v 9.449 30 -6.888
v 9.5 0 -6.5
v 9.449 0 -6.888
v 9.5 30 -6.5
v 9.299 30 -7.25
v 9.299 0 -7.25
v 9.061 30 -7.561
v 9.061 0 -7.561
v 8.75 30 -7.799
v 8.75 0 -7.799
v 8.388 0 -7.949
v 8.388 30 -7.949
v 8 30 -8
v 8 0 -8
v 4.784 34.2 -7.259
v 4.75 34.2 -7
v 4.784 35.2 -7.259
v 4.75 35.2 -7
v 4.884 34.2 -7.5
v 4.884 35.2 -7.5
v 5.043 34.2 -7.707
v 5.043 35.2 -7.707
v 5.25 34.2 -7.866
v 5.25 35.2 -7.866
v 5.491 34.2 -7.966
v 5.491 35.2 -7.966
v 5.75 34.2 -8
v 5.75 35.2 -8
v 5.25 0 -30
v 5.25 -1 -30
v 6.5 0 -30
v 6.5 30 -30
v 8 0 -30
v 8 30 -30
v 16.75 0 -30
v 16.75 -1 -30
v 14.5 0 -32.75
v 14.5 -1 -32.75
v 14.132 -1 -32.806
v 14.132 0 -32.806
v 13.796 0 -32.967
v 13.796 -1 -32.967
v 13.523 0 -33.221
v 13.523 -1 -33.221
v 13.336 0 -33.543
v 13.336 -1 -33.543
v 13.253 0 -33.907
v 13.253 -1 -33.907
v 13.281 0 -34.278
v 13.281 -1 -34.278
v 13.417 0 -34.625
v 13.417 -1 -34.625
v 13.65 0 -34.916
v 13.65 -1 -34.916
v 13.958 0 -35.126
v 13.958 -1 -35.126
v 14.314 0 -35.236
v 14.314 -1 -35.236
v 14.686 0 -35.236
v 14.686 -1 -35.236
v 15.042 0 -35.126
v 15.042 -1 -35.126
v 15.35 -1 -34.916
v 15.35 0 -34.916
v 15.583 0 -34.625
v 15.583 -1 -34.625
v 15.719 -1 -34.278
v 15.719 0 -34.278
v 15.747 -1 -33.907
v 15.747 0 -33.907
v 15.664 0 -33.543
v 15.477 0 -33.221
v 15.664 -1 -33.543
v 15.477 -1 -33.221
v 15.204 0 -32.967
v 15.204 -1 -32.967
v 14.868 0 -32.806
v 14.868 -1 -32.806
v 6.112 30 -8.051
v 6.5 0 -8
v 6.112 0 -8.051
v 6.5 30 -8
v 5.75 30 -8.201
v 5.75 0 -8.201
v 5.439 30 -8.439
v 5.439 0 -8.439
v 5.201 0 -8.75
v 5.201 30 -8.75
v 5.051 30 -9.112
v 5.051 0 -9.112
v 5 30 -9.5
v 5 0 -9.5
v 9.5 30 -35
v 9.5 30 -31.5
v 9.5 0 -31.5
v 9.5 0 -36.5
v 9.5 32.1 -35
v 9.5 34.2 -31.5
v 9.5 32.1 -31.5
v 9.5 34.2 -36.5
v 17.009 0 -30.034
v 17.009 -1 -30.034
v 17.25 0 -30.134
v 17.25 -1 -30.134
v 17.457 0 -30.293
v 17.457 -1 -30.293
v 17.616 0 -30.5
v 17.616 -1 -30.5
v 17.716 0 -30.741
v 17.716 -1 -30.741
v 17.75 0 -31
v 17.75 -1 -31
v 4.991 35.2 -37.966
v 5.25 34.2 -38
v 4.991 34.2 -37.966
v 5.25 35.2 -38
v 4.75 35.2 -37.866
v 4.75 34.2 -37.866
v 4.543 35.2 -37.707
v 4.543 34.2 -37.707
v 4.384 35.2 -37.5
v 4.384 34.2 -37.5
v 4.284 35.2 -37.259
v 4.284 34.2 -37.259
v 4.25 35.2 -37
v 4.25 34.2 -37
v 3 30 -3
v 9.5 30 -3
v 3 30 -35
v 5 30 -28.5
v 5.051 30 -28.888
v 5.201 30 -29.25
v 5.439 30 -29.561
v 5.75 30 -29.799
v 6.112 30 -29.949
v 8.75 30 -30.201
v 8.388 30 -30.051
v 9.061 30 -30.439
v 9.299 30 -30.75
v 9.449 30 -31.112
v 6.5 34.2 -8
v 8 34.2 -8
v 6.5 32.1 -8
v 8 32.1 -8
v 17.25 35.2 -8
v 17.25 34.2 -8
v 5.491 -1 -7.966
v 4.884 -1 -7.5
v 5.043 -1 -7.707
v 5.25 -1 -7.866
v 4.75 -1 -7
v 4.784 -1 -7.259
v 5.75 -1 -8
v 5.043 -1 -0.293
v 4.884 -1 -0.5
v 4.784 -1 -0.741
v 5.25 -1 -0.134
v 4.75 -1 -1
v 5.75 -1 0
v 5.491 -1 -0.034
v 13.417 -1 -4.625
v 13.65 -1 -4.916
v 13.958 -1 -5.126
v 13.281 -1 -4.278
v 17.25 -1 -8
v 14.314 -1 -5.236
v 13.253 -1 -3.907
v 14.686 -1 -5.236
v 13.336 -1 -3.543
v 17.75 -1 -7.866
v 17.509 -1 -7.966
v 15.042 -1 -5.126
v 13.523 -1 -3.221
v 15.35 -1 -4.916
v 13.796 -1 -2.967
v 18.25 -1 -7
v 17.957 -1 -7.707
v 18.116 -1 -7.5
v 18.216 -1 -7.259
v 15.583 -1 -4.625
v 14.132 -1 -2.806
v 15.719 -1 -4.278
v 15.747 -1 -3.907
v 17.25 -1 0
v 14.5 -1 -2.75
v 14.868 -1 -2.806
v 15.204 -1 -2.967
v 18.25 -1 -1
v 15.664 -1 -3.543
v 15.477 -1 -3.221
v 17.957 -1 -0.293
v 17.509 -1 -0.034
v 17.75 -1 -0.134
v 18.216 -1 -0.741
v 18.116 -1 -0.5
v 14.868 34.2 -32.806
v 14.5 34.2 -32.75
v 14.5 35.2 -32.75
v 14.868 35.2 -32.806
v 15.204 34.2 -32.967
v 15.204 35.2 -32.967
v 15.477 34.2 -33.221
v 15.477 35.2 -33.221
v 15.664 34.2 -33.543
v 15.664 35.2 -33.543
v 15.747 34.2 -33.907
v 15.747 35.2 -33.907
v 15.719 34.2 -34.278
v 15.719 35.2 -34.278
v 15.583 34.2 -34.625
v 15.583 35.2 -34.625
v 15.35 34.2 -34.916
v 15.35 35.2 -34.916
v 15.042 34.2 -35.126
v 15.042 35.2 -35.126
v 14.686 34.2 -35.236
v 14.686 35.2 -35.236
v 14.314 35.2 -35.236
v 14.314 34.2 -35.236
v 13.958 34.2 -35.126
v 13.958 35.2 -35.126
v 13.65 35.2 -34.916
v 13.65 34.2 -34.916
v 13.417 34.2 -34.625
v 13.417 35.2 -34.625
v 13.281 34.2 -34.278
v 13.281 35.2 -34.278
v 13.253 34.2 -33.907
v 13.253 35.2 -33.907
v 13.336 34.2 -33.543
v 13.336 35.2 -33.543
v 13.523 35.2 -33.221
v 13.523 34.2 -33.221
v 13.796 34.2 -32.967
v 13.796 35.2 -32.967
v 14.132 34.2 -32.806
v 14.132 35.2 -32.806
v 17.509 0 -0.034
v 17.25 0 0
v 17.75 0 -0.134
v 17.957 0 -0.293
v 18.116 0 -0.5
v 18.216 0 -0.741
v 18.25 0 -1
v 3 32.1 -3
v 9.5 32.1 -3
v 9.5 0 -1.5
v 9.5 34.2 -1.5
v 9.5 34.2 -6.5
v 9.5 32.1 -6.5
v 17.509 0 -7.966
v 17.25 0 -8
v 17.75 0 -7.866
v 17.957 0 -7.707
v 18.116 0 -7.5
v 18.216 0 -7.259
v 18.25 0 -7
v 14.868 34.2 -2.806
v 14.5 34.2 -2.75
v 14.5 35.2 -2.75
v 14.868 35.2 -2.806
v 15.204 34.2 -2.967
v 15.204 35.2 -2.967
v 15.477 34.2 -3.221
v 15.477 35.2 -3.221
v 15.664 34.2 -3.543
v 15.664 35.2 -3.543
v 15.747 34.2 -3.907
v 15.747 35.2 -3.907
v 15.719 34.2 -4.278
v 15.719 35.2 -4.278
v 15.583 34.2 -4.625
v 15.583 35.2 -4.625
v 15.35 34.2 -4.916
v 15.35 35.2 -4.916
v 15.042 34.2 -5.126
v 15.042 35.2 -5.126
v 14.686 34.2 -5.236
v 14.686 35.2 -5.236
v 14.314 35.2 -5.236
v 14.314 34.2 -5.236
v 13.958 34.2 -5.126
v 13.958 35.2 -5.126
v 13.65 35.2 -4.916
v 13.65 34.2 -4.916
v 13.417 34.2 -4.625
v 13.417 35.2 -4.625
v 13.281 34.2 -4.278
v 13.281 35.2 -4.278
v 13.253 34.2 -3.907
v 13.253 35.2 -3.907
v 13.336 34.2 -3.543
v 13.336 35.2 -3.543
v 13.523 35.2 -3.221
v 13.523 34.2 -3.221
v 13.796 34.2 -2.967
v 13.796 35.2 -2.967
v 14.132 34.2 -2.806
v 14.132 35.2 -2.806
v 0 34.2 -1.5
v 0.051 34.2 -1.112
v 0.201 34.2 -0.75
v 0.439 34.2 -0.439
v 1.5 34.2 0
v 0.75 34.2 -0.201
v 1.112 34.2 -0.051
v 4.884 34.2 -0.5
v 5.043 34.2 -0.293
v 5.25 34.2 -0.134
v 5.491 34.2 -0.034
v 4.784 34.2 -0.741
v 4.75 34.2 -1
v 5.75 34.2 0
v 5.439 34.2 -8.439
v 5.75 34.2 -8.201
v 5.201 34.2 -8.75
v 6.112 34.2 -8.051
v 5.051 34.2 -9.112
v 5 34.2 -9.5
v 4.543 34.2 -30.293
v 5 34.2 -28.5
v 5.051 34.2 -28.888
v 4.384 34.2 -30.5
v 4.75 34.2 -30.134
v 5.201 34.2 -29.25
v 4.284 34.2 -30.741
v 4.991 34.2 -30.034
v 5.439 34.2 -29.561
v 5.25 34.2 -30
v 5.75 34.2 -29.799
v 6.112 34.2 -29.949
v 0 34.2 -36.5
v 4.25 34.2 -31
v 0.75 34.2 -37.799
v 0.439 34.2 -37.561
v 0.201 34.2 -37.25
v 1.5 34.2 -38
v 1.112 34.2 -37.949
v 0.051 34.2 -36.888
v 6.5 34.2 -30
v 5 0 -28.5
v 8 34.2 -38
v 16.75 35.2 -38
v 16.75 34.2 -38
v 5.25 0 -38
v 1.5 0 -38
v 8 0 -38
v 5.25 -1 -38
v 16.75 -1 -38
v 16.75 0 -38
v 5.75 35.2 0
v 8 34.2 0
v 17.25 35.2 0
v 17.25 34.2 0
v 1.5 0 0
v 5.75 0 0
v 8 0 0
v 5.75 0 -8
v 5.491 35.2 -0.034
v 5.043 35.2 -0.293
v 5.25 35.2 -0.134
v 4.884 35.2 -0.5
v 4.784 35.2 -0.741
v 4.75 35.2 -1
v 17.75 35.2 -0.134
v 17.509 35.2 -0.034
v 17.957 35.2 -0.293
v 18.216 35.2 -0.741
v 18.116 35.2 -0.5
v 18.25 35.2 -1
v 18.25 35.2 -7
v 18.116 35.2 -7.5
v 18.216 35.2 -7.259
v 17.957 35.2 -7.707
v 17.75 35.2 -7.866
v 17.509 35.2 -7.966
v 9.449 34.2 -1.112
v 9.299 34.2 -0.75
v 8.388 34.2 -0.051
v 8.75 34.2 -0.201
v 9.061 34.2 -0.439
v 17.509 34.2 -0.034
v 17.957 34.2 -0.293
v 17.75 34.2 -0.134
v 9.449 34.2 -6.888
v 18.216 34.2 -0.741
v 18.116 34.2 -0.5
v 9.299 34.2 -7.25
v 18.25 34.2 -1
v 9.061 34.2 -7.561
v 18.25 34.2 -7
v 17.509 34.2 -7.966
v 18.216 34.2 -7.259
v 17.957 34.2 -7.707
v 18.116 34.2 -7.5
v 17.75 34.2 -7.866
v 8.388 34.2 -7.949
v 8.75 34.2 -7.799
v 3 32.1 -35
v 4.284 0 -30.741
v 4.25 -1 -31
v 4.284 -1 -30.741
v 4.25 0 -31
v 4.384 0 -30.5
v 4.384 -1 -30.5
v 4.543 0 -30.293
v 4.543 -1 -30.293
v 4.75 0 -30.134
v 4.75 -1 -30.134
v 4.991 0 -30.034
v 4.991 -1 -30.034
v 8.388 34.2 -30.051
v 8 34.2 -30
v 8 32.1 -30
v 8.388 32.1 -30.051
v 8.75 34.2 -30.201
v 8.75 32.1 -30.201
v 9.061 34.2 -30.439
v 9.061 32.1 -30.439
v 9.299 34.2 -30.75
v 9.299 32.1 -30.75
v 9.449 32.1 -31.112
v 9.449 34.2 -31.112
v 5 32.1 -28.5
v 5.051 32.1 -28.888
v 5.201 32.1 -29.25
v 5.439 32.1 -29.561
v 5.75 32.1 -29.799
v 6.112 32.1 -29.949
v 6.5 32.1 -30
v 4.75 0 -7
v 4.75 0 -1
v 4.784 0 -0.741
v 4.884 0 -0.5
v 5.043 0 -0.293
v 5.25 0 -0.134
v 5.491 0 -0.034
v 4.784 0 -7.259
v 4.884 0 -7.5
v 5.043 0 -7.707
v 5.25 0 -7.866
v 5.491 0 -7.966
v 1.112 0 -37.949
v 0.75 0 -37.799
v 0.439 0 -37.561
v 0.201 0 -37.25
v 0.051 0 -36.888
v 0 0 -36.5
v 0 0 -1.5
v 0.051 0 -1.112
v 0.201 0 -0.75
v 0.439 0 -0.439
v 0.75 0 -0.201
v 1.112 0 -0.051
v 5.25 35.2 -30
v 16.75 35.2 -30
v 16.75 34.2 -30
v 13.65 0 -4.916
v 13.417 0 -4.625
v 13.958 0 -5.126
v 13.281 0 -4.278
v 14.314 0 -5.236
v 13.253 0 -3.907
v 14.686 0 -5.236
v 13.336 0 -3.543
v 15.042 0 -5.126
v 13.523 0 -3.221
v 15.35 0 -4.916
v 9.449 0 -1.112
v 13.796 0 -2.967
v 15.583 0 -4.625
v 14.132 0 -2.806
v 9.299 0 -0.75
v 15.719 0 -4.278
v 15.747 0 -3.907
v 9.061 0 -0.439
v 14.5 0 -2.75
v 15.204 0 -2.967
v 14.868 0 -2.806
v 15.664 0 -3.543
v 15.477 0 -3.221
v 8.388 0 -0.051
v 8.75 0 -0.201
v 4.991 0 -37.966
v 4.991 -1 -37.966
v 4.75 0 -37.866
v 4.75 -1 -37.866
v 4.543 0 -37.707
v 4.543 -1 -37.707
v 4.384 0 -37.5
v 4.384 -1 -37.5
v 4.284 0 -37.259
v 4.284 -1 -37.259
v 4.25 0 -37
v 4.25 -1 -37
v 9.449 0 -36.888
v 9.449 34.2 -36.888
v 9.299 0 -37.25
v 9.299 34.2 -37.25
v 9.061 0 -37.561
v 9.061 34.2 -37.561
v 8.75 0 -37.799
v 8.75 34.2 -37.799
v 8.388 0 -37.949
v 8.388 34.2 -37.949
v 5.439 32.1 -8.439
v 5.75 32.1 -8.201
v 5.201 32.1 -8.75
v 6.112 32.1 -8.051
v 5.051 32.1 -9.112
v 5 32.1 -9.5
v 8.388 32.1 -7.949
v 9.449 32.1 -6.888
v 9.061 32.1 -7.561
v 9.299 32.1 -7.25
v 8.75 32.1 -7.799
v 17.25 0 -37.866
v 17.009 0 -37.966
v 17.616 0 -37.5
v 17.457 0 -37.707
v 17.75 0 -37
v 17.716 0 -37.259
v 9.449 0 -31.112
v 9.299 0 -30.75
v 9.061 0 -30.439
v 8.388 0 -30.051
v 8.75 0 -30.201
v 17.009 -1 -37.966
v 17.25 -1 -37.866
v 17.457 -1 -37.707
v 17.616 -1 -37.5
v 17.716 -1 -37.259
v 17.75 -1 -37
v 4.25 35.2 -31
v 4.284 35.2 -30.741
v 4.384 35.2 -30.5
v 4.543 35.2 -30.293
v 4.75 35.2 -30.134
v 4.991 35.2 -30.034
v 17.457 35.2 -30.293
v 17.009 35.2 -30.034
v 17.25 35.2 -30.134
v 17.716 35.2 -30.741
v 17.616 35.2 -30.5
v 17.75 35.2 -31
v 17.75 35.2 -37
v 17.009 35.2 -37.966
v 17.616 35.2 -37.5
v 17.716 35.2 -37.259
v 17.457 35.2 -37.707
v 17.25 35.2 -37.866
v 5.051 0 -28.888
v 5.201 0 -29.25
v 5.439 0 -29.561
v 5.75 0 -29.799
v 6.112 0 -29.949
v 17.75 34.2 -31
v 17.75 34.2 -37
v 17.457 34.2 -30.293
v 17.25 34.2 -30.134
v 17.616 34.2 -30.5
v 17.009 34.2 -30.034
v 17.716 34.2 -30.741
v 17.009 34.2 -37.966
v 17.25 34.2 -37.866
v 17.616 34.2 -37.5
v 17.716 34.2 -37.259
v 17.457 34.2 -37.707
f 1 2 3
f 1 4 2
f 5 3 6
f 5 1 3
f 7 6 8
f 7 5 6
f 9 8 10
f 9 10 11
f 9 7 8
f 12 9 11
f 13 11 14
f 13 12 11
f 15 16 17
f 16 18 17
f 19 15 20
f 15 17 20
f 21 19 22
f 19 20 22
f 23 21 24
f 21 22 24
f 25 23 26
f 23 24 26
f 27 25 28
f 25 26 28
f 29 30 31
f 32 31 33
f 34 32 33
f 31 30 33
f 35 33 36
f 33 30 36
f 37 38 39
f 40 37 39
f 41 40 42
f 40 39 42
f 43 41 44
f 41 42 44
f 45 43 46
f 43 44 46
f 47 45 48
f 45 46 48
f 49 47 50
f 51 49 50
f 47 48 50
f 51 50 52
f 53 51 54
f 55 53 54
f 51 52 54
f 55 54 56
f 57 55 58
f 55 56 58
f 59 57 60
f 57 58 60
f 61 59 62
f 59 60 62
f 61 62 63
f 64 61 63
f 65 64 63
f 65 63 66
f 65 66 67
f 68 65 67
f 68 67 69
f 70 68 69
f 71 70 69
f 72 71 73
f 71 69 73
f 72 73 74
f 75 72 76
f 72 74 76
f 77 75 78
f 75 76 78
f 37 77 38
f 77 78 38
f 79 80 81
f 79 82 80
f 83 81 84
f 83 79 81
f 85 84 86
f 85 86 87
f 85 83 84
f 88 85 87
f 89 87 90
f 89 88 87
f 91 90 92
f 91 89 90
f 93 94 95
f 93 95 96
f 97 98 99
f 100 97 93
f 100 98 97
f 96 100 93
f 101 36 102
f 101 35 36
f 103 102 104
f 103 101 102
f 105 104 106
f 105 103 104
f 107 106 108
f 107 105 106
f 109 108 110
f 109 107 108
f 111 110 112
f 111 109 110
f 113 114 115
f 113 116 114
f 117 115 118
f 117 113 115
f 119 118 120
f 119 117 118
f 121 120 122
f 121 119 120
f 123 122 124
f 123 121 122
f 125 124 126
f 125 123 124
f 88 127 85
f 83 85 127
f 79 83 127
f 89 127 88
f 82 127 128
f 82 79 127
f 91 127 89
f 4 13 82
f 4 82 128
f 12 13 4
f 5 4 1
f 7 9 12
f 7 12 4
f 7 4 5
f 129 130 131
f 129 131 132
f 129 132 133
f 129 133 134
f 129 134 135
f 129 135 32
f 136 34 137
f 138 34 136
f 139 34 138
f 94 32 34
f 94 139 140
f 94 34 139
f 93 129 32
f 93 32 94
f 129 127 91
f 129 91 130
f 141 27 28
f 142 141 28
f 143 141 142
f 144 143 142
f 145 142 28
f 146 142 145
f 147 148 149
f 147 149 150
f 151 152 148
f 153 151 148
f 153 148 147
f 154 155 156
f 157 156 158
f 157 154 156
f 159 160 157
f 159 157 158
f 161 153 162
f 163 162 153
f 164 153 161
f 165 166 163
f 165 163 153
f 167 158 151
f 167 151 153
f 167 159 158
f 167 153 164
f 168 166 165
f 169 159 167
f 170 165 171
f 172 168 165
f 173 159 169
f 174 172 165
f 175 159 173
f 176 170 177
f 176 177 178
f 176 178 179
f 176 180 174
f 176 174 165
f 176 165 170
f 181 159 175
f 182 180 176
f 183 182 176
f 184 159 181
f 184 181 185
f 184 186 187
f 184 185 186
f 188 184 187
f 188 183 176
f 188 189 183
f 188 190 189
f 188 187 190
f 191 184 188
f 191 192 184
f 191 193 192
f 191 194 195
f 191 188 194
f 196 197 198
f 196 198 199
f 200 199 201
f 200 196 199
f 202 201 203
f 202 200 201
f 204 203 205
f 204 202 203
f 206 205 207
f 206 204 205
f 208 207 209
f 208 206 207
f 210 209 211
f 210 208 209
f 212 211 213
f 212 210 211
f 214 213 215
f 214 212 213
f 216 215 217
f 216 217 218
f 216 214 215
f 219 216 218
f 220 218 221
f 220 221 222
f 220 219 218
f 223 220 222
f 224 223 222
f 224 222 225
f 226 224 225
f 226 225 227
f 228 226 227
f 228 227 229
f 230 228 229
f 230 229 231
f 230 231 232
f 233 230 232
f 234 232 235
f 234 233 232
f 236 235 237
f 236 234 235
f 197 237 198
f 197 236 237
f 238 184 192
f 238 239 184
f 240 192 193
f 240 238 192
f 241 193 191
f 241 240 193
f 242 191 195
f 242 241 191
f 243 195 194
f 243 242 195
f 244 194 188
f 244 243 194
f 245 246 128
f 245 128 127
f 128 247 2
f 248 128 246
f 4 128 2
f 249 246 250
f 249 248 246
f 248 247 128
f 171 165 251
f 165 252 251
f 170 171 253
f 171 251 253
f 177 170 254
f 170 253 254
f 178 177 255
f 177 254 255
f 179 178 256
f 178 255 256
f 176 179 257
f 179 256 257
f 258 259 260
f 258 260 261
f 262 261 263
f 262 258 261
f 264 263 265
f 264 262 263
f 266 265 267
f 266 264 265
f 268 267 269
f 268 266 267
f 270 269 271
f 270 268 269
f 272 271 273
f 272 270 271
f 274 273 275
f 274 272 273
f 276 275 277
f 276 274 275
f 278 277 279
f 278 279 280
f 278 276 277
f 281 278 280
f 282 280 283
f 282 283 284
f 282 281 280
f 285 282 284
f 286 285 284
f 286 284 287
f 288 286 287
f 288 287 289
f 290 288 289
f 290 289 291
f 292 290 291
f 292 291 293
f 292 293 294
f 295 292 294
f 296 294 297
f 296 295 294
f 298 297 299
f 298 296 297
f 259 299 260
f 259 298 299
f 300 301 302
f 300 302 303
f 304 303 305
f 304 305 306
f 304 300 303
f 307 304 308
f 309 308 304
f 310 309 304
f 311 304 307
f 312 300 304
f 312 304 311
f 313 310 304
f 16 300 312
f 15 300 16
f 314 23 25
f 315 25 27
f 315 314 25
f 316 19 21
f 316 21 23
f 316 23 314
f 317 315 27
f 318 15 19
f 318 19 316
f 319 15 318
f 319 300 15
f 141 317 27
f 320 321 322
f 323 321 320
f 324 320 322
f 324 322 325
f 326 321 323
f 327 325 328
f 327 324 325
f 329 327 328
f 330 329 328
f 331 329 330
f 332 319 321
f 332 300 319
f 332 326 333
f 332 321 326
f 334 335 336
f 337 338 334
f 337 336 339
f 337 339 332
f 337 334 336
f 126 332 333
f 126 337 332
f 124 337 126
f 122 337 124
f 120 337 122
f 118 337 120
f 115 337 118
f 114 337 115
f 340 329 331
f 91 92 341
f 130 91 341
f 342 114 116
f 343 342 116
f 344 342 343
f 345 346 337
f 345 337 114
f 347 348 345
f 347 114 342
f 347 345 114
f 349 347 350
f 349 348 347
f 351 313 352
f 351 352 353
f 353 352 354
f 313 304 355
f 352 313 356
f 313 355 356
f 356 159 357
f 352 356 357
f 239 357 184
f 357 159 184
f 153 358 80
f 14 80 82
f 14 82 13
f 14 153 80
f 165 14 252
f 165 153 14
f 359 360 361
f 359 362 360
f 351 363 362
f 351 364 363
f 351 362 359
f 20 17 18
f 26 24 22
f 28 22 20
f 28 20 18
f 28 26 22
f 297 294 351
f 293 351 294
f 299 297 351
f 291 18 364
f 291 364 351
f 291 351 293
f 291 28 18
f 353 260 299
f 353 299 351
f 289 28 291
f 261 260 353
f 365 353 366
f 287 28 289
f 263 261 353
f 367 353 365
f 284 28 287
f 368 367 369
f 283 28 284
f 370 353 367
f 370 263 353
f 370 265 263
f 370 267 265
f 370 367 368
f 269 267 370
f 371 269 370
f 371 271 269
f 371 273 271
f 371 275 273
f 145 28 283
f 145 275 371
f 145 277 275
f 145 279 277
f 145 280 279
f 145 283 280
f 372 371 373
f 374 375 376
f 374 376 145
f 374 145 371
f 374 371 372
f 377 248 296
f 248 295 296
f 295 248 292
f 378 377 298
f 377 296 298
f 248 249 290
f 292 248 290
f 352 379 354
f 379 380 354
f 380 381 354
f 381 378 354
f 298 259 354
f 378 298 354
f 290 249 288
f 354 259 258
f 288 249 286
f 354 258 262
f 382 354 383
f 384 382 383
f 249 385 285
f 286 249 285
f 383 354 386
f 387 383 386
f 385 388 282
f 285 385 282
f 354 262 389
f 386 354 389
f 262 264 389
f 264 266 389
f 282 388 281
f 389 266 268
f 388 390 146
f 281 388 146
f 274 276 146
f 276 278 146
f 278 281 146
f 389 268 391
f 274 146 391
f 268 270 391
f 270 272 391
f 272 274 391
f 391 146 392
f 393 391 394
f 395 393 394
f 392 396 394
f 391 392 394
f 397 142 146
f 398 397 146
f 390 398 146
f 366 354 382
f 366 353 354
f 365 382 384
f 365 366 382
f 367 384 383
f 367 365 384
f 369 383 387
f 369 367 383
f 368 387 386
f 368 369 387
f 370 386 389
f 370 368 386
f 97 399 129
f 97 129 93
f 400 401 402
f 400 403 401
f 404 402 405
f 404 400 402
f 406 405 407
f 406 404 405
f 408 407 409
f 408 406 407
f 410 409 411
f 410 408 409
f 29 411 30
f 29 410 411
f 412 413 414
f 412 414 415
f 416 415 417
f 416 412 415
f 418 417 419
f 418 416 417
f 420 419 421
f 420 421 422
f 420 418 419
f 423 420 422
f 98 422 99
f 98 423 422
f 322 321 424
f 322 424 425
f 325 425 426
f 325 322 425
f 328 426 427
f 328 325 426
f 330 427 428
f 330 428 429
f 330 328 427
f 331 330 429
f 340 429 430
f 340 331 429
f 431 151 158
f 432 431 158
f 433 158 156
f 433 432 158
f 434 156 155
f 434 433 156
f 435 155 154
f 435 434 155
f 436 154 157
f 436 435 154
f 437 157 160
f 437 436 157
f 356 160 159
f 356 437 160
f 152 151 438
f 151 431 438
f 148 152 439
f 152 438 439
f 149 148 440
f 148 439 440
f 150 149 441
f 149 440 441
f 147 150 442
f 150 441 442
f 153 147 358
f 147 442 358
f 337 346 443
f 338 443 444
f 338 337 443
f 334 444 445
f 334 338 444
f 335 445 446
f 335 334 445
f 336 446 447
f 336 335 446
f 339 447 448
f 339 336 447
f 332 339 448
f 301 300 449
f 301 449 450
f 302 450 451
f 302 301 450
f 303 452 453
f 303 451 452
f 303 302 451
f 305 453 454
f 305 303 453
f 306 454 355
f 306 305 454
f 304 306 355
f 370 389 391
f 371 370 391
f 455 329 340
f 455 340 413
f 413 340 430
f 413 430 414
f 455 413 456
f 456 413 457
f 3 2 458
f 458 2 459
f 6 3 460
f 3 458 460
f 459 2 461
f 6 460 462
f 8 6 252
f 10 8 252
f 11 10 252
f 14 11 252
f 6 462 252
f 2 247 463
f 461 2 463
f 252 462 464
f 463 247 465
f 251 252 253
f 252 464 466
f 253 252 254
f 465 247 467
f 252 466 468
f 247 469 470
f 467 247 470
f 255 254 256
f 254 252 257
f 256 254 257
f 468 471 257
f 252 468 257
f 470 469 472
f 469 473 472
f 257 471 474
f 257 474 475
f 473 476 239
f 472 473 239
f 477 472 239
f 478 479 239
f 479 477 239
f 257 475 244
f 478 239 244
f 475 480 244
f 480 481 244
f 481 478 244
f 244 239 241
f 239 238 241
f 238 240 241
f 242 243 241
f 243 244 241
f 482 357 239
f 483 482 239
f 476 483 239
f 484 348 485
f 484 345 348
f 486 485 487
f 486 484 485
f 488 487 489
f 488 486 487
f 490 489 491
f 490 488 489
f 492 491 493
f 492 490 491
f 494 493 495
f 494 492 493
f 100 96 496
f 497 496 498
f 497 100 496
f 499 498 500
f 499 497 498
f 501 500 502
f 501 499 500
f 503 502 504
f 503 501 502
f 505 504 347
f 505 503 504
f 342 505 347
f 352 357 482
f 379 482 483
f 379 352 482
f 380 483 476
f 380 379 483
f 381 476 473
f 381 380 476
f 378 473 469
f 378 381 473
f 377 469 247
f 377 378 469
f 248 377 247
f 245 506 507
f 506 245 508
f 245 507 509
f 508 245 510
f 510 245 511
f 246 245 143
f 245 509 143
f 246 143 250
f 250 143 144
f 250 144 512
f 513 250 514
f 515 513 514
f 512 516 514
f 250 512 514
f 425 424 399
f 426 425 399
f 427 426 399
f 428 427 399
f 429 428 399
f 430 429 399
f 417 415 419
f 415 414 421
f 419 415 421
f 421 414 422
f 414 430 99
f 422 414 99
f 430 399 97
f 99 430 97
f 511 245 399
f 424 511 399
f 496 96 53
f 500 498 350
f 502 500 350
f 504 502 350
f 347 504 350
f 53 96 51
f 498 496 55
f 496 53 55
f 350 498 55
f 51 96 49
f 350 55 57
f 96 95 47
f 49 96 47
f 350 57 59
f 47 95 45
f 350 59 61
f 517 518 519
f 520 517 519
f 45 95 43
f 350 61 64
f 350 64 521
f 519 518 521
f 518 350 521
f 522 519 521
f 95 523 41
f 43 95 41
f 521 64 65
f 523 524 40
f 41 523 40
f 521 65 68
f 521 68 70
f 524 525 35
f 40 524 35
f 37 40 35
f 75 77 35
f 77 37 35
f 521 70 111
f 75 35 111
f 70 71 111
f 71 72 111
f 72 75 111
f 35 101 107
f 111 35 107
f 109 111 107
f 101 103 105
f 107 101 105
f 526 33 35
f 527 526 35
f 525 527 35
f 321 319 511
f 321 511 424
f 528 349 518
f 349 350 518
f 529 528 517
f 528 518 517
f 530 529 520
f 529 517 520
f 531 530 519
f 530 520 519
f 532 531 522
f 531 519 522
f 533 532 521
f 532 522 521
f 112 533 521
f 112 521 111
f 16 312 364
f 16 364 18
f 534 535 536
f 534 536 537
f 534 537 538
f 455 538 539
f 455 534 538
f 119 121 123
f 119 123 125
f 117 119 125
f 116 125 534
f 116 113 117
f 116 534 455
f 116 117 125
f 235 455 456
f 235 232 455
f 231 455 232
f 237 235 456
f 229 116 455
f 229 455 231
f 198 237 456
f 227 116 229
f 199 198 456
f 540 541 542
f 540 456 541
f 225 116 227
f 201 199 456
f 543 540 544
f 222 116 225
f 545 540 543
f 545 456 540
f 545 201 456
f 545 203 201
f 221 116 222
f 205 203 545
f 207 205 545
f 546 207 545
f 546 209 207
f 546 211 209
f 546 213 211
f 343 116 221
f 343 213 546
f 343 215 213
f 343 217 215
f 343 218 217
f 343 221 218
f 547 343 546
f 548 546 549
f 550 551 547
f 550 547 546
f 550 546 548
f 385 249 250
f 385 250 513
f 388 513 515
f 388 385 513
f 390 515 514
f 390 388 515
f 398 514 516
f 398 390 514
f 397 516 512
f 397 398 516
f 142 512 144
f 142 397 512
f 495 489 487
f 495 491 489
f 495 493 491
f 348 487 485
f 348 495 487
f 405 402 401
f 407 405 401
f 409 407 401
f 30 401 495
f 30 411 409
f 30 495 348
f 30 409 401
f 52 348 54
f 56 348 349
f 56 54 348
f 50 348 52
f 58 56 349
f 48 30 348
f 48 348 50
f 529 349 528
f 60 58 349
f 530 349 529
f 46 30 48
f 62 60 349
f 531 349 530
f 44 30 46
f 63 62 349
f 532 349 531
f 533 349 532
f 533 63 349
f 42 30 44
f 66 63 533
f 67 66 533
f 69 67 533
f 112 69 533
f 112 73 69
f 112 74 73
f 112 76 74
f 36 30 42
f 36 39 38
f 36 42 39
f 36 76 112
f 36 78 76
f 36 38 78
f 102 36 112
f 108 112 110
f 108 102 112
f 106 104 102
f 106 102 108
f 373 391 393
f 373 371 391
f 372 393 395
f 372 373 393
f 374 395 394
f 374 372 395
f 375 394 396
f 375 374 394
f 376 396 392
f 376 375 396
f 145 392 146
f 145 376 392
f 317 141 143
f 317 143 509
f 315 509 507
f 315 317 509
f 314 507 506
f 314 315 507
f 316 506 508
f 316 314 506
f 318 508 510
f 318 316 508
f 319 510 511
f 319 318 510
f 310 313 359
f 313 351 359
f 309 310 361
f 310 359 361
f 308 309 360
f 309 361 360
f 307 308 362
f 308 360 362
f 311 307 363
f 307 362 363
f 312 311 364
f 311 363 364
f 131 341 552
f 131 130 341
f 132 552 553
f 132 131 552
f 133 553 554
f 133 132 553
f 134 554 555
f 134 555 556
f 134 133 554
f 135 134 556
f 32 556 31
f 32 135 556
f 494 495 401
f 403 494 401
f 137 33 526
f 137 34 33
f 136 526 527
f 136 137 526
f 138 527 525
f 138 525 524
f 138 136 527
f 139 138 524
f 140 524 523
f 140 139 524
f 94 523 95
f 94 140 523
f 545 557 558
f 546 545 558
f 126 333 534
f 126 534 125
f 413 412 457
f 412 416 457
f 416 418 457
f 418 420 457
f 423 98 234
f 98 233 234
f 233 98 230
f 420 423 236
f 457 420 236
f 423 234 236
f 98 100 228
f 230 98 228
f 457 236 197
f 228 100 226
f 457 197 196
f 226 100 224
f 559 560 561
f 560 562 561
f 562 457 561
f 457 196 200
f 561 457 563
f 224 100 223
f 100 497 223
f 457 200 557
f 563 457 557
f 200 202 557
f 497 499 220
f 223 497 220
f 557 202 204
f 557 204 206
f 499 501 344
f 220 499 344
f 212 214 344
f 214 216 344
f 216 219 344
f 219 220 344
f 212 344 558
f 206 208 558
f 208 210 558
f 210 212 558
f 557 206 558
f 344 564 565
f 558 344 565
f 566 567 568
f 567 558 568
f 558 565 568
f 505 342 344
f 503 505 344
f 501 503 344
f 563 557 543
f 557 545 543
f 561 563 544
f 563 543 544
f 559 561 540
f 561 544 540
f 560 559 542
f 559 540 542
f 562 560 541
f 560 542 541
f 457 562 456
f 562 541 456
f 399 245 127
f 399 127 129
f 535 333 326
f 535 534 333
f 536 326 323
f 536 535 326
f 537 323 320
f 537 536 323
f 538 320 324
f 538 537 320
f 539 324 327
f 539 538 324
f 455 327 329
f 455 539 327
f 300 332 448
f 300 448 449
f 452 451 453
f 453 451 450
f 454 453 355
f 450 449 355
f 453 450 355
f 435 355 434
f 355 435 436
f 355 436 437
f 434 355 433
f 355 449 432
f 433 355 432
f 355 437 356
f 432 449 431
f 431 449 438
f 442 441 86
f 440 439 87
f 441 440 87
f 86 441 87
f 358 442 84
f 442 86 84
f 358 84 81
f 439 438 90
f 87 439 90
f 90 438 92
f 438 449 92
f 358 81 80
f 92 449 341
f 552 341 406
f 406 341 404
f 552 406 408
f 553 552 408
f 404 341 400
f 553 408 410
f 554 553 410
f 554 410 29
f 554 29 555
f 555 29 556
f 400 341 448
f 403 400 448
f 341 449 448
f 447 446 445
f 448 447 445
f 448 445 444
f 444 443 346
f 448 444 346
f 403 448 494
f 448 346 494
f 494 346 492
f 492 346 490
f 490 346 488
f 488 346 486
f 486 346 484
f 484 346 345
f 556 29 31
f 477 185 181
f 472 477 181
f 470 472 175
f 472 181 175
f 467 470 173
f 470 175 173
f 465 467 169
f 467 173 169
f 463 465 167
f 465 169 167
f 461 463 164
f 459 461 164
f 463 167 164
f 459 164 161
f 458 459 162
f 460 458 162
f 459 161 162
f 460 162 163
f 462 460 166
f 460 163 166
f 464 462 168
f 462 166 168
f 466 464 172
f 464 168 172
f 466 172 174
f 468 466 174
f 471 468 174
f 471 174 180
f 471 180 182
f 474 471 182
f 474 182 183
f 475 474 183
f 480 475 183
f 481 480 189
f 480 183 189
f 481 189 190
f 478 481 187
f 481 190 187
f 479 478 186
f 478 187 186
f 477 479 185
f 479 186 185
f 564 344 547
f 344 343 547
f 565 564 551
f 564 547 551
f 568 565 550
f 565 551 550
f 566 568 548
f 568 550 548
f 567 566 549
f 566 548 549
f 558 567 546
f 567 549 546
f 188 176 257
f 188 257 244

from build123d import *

# Parameters (mm, degrees)
SALIENTE_EXTRUIR1_DEPTH = 30
REDONDEO1_R             = 1.5
SALIENTE_EXTRUIR2_START = 2.1
SALIENTE_EXTRUIR2_DEPTH = 2.1
SALIENTE_EXTRUIR3_START = 2.1
SALIENTE_EXTRUIR3_DEPTH = 2.1
CROQUIS4_W              = 13.5
CROQUIS4_H              = 8
CROQUIS4_R              = 1.25
SALIENTE_EXTRUIR4_DEPTH = 1
SALIENTE_EXTRUIR5_START = 1
CROQUIS5_W              = 13.5
CROQUIS5_H              = 8
CROQUIS5_R              = 1.25
SALIENTE_EXTRUIR5_DEPTH = 1
REDONDEO2_R             = 1


with BuildPart() as part:
    # Croquis1 → Saliente-Extruir1 (new body)
    with BuildSketch(Plane(origin=(0, 0, 0), x_dir=(1, 0, 0), z_dir=(0, 1, 0))):
        Polygon((0, 0), (9.5, 0), (9.5, 8), (5, 8), (5, 30), (9.5, 30), (9.5, 38), (0, 38), align=None)
    extrude(amount=SALIENTE_EXTRUIR1_DEPTH)

    # Redondeo1
    redondeo1_edges = [part.edges().sort_by_distance(p)[0] for p in [
        (0, 15, -38),
        (9.5, 15, -38),
        (9.5, 15, -30),
        (5, 15, -30),
        (5, 15, -8),
        (9.5, 15, -8),
        (9.5, 15, 0),
        (0, 15, 0),
    ]]
    fillet(redondeo1_edges, radius=REDONDEO1_R)

    # Croquis2 → Saliente-Extruir2 (add)
    with BuildSketch(Plane(origin=(0, 30, 0), x_dir=(1, 0, 0), z_dir=(0, 1, 0)).offset(SALIENTE_EXTRUIR2_START)):
        with BuildLine():
            Line((0, 36.5), (0, 1.5))
            ThreePointArc((0, 1.5), (0.439339828, 0.439339828), (1.5, 0))
            Line((1.5, 0), (8, 0))
            ThreePointArc((8, 0), (9.060660172, 0.439339828), (9.5, 1.5))
            Line((9.5, 1.5), (9.5, 3))
            Line((9.5, 3), (3, 3))
            Line((3, 3), (3, 35))
            Line((3, 35), (9.5, 35))
            Line((9.5, 35), (9.5, 36.5))
            ThreePointArc((9.5, 36.5), (9.060660172, 37.560660172), (8, 38))
            Line((8, 38), (1.5, 38))
            ThreePointArc((1.5, 38), (0.439339828, 37.560660172), (0, 36.5))
        make_face()
    extrude(amount=-SALIENTE_EXTRUIR2_DEPTH)

    # Croquis3 → Saliente-Extruir3 (add)
    with BuildSketch(Plane(origin=(0, 32.1, 0), x_dir=(1, 0, 0), z_dir=(0, 1, 0)).offset(SALIENTE_EXTRUIR3_START)):
        with BuildLine():
            Line((8, 8), (6.5, 8))
            ThreePointArc((6.5, 8), (5.439339828, 8.439339828), (5, 9.5))
            Line((5, 9.5), (5, 28.5))
            ThreePointArc((5, 28.5), (5.439339828, 29.560660172), (6.5, 30))
            Line((6.5, 30), (8, 30))
            ThreePointArc((8, 30), (9.060660172, 30.439339828), (9.5, 31.5))
            Line((9.5, 31.5), (9.5, 36.5))
            ThreePointArc((9.5, 36.5), (9.060660172, 37.560660172), (8, 38))
            Line((8, 38), (1.5, 38))
            ThreePointArc((1.5, 38), (0.439339828, 37.560660172), (0, 36.5))
            Line((0, 36.5), (0, 1.5))
            ThreePointArc((0, 1.5), (0.439339828, 0.439339828), (1.5, 0))
            Line((1.5, 0), (8, 0))
            ThreePointArc((8, 0), (9.060660172, 0.439339828), (9.5, 1.5))
            Line((9.5, 1.5), (9.5, 6.5))
            ThreePointArc((9.5, 6.5), (9.060660172, 7.560660172), (8, 8))
        make_face()
    extrude(amount=-SALIENTE_EXTRUIR3_DEPTH)

    # Croquis4 → Saliente-Extruir4 (add)
    # profile 1 of 2: a face of its own
    with BuildSketch(Plane(origin=(0, 34.2, 0), x_dir=(1, 0, 0), z_dir=(0, 1, 0))):
        with Locations((11, 34)):
            Rectangle(CROQUIS4_W, CROQUIS4_H)
        with Locations(Location((14.5, 34, 0), (0, 0, 270))):
            Circle(CROQUIS4_R, mode=Mode.SUBTRACT)
    # profile 2 of 2: a face of its own
    with BuildSketch(Plane(origin=(0, 34.2, 0), x_dir=(1, 0, 0), z_dir=(0, 1, 0))):
        with Locations((11.5, 4)):
            Rectangle(CROQUIS4_W, CROQUIS4_H)
        with Locations(Location((14.5, 4, 0), (0, 0, 270))):
            Circle(CROQUIS4_R, mode=Mode.SUBTRACT)
    extrude(amount=SALIENTE_EXTRUIR4_DEPTH)

    # Croquis5 → Saliente-Extruir5 (add)
    # profile 1 of 2: a face of its own
    with BuildSketch(Plane.XZ.offset(SALIENTE_EXTRUIR5_START)):
        with Locations((11.5, -4)):
            Rectangle(CROQUIS5_W, CROQUIS5_H)
        with Locations(Location((14.5, -4, 0), (0, 0, 90))):
            Circle(CROQUIS5_R, mode=Mode.SUBTRACT)
    # profile 2 of 2: a face of its own
    with BuildSketch(Plane.XZ.offset(SALIENTE_EXTRUIR5_START)):
        with Locations((11, -34)):
            Rectangle(CROQUIS5_W, CROQUIS5_H)
        with Locations(Location((14.5, -34, 0), (0, 0, 90))):
            Circle(CROQUIS5_R, mode=Mode.SUBTRACT)
    extrude(amount=-SALIENTE_EXTRUIR5_DEPTH)

    # Redondeo2
    redondeo2_edges = [part.edges().sort_by_distance(p)[0] for p in [
        (4.25, 34.7, -38),
        (4.25, 34.7, -30),
        (17.75, 34.7, -30),
        (17.75, 34.7, -38),
        (4.75, 34.7, -8),
        (4.75, 34.7, 0),
        (18.25, 34.7, 0),
        (18.25, 34.7, -8),
        (4.75, -0.5, 0),
        (4.75, -0.5, -8),
        (18.25, -0.5, -8),
        (18.25, -0.5, 0),
        (4.25, -0.5, -30),
        (4.25, -0.5, -38),
        (17.75, -0.5, -38),
        (17.75, -0.5, -30),
    ]]
    fillet(redondeo2_edges, radius=REDONDEO2_R)


solid = part.part
